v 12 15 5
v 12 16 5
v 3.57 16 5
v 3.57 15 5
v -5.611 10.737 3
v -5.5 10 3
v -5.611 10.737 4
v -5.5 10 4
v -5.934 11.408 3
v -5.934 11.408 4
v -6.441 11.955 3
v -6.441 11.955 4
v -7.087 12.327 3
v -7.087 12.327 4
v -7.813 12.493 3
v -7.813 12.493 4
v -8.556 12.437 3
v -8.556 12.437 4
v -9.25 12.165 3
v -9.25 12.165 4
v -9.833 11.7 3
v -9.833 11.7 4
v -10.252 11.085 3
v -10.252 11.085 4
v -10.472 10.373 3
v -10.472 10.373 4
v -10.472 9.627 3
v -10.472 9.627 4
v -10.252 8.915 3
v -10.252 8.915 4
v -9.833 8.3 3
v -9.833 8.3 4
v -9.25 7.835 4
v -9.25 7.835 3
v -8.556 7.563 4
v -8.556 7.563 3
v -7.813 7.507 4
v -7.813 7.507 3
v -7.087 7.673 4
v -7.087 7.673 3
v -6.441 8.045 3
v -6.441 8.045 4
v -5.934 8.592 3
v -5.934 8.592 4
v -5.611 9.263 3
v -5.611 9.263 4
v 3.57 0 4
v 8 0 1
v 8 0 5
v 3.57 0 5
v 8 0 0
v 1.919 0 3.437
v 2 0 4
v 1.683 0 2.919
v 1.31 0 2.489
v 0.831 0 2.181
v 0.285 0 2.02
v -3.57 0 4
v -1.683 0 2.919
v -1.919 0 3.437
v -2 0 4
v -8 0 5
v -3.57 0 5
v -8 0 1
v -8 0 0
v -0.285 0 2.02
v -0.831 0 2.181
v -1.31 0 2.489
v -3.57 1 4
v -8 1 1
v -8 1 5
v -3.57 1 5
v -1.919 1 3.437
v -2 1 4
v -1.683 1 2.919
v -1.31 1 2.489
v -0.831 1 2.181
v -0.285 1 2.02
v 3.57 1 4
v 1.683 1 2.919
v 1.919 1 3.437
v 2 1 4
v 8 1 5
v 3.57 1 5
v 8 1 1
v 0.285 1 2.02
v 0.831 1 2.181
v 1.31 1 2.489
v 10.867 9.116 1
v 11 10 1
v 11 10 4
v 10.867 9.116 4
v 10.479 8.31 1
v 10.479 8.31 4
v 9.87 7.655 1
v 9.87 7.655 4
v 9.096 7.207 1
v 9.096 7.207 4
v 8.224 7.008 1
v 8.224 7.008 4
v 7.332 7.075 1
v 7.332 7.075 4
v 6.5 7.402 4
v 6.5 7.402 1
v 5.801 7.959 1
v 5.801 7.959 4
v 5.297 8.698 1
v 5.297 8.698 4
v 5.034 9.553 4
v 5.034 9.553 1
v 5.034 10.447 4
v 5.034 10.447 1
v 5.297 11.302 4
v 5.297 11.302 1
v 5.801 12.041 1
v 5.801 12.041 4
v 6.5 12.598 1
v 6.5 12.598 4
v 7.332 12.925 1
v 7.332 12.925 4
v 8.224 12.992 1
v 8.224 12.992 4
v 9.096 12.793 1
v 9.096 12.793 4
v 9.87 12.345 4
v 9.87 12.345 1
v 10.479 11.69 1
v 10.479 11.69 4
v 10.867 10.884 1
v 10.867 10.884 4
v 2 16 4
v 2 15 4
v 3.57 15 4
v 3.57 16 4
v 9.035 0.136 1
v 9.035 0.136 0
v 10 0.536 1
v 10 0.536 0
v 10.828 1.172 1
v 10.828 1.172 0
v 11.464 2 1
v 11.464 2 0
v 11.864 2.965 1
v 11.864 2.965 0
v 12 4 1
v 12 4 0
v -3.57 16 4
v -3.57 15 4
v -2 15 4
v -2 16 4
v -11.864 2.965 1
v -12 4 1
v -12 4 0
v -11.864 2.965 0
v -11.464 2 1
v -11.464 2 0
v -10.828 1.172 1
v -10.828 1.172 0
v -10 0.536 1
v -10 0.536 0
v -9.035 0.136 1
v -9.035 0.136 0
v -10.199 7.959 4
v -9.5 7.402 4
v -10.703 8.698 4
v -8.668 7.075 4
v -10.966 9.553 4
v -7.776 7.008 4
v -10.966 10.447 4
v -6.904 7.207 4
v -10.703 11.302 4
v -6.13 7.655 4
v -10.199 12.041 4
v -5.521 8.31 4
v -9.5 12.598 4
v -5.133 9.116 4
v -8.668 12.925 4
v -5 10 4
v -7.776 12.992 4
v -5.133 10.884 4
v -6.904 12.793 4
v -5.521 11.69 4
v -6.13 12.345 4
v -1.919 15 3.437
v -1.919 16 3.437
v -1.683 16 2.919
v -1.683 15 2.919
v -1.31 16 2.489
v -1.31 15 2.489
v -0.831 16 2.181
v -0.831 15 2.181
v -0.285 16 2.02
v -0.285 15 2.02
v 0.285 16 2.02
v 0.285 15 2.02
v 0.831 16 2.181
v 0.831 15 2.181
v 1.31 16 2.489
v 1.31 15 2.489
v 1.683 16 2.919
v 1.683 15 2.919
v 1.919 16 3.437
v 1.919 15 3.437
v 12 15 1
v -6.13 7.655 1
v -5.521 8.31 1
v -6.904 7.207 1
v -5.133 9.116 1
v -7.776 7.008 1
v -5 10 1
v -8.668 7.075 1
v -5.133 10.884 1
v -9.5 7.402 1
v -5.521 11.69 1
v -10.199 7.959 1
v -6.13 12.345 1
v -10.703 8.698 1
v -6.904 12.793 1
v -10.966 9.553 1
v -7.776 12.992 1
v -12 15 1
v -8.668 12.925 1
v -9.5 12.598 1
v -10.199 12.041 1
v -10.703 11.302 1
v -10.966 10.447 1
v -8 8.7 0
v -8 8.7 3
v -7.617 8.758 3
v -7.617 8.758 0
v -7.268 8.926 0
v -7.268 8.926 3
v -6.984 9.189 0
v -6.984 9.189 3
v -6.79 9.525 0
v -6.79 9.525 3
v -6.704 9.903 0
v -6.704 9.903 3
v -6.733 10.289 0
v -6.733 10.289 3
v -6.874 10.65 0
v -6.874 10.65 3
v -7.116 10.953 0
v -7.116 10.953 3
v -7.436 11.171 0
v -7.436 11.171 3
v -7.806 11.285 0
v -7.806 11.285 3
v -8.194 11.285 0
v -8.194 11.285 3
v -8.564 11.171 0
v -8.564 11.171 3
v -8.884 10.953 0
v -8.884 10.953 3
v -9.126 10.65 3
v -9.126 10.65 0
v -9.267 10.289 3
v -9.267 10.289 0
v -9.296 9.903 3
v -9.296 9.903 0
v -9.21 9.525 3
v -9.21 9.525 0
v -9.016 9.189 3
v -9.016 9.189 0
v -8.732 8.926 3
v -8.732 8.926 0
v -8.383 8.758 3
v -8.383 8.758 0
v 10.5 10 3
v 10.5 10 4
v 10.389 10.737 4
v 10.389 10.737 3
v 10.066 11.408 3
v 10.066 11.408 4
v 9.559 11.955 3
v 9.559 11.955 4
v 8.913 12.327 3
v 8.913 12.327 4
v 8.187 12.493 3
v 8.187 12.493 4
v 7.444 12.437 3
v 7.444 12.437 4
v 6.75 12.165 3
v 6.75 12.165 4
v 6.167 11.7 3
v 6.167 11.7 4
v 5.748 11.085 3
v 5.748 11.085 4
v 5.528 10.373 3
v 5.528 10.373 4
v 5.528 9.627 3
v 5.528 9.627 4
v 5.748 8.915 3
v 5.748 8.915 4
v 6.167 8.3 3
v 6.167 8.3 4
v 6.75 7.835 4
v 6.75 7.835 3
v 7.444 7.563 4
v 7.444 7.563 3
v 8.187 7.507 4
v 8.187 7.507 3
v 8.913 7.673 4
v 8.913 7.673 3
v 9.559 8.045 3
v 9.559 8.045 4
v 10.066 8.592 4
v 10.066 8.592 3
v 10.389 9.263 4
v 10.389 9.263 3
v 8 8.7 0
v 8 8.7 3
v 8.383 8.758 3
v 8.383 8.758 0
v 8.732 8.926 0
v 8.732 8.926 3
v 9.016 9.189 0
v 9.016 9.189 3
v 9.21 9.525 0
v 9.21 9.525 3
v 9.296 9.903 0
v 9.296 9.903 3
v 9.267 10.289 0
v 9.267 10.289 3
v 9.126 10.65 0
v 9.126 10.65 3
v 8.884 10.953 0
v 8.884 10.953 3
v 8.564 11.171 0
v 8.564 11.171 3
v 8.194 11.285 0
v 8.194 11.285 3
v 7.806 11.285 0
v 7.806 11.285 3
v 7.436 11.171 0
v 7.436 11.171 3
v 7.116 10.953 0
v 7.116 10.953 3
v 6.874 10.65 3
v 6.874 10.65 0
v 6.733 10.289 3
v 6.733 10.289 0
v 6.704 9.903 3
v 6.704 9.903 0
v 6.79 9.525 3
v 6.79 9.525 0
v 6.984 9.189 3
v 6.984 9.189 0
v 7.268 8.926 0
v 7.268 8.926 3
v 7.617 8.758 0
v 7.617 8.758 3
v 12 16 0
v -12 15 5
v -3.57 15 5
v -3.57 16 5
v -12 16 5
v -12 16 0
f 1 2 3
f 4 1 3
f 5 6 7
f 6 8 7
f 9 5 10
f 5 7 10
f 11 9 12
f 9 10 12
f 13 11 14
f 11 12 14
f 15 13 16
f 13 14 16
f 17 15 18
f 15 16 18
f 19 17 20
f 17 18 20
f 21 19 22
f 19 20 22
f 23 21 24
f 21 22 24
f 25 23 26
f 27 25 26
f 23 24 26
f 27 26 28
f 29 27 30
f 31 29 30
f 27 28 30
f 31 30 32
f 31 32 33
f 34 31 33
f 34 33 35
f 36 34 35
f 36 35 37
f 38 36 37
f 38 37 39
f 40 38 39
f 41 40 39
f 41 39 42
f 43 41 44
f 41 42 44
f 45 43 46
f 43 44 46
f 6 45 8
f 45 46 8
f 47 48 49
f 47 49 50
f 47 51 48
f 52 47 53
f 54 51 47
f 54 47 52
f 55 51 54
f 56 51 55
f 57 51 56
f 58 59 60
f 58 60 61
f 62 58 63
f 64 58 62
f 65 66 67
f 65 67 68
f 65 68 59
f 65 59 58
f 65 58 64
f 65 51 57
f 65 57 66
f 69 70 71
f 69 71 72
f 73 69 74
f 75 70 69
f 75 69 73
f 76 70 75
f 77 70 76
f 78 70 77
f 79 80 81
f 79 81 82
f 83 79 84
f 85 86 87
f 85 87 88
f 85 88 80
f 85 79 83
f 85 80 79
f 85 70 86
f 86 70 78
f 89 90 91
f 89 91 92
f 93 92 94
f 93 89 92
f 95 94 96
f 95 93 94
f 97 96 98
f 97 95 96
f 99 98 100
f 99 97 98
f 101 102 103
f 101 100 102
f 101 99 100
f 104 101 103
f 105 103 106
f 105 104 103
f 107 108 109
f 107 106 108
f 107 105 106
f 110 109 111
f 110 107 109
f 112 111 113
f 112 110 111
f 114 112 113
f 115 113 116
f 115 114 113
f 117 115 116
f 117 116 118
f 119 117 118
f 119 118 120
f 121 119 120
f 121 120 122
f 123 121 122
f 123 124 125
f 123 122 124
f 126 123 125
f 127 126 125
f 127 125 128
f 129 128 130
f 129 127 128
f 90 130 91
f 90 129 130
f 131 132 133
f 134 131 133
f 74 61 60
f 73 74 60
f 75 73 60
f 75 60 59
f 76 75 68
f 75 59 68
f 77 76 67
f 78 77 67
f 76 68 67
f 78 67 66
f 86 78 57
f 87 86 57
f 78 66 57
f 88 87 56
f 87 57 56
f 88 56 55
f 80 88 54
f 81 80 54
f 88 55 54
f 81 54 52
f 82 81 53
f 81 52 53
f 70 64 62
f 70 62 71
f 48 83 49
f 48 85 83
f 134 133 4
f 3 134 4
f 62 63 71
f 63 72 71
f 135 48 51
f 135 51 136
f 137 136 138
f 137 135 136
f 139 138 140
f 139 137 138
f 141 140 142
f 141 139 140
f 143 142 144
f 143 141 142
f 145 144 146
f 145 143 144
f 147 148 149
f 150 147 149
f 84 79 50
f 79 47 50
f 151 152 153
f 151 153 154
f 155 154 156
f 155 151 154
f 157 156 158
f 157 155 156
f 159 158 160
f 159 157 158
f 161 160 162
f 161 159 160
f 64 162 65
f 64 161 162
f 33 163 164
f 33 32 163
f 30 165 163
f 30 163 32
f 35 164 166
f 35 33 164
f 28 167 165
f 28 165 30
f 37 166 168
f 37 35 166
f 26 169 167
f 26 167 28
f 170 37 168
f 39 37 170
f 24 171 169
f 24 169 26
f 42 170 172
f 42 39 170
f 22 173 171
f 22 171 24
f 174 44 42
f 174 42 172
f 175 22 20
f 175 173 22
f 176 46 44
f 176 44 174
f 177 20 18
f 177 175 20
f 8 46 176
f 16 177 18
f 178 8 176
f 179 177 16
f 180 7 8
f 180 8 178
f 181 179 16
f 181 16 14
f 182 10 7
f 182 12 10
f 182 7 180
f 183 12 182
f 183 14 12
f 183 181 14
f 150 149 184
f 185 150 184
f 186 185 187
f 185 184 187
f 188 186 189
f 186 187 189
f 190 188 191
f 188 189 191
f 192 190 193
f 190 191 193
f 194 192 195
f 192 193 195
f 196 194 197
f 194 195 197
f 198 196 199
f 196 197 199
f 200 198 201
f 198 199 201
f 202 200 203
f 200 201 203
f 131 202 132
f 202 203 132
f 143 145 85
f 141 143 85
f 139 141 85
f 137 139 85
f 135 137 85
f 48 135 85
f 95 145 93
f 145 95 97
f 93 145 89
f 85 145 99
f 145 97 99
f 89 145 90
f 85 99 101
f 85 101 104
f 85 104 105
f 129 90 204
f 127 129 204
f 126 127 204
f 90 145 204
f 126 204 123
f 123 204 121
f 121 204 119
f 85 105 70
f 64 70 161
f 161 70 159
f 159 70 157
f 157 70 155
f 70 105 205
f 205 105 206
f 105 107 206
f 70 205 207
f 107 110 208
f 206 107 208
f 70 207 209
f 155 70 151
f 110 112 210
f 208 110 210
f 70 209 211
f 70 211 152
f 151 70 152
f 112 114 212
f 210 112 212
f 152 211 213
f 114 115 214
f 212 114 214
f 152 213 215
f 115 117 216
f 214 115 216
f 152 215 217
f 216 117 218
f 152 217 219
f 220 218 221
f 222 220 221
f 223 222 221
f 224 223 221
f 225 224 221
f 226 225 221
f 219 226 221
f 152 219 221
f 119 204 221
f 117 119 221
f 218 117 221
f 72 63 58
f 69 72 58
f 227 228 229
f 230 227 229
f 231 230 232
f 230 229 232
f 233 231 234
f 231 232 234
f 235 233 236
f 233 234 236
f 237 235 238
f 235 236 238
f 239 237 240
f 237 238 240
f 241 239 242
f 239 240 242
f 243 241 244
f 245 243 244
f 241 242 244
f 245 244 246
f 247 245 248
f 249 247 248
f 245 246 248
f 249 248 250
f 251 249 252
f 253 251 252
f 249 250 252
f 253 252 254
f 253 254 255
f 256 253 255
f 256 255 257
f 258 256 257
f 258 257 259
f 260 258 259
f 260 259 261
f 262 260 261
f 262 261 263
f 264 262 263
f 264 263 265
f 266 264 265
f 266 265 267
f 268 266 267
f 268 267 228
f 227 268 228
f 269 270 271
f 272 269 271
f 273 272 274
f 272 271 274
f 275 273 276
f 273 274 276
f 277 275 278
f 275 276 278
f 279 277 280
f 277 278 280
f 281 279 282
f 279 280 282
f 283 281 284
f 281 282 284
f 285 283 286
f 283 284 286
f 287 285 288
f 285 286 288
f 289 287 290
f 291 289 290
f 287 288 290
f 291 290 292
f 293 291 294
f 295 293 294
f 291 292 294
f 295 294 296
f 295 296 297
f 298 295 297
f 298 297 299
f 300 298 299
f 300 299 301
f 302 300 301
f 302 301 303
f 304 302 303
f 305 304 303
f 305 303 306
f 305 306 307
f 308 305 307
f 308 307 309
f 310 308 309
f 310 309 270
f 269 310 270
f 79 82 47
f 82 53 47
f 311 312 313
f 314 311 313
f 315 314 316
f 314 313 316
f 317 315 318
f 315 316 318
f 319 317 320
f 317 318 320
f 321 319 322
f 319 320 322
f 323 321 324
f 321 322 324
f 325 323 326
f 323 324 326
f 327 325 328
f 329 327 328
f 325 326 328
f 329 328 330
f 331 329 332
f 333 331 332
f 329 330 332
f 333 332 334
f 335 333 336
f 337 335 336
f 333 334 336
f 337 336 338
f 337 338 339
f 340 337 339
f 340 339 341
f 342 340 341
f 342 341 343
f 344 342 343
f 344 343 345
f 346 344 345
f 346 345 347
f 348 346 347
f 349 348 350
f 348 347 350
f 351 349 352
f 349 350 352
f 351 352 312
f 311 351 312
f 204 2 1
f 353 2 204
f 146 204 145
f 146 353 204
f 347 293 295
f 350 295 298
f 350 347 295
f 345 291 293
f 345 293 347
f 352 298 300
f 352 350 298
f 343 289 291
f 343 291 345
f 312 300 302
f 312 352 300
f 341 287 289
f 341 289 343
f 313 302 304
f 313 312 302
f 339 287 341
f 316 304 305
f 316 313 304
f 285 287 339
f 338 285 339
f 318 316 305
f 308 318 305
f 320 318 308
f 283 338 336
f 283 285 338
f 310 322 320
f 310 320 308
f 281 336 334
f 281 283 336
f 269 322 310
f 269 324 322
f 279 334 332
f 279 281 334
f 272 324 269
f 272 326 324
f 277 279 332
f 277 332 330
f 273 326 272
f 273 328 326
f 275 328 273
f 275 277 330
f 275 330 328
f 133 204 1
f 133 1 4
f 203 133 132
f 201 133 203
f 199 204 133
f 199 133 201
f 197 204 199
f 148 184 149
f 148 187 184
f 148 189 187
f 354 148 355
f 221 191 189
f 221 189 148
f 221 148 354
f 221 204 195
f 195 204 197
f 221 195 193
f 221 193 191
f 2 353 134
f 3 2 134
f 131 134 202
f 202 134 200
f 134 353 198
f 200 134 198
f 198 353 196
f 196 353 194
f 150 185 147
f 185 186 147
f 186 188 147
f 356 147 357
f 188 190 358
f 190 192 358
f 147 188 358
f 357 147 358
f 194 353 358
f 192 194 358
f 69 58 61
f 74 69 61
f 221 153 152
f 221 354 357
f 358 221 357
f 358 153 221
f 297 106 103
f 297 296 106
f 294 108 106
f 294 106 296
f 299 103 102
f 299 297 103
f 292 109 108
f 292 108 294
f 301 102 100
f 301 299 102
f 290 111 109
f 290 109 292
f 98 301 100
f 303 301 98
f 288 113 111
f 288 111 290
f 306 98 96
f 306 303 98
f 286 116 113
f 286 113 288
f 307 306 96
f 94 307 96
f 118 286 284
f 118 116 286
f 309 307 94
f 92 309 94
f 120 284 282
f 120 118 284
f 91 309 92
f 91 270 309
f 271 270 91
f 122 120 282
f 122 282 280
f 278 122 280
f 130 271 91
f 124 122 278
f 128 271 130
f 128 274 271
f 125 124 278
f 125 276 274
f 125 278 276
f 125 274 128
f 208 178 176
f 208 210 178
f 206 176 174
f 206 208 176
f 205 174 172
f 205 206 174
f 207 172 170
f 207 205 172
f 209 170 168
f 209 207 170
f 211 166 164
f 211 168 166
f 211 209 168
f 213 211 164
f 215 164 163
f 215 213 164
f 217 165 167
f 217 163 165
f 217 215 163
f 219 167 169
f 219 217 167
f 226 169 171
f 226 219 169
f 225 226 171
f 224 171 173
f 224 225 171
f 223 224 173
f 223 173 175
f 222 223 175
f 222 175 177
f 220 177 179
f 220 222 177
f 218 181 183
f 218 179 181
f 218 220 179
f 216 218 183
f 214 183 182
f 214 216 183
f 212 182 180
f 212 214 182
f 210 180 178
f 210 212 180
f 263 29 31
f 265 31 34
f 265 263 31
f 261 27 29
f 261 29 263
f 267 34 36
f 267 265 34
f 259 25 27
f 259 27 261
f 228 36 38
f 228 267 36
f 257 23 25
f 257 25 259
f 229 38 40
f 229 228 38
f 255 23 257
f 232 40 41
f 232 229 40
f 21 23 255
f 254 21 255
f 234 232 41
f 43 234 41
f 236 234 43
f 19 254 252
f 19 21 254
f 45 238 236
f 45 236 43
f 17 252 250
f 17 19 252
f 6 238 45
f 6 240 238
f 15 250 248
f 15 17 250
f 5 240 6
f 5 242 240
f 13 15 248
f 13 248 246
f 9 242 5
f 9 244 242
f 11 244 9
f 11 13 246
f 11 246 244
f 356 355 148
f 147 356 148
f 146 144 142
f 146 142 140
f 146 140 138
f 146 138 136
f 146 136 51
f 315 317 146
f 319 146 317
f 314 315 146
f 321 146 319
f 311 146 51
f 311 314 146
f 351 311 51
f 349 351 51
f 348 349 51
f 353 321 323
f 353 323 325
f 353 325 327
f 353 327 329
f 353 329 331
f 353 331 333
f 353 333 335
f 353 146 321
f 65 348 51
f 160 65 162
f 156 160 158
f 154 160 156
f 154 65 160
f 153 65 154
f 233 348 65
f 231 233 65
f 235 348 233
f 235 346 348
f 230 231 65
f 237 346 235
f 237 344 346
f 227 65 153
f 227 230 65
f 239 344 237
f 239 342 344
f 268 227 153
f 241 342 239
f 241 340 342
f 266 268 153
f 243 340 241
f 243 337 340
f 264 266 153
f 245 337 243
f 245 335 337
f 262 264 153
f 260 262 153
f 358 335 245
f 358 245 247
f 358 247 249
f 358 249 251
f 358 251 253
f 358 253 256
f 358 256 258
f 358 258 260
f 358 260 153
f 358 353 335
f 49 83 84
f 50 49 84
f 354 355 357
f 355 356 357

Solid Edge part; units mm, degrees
sketch "Sketch1" plane through (0, 0, 0) normal (0, 0, 1) x (1, 0, 0)
  line L0 (12, 16) -> (12, 0)
  line L1 (12, 0) -> (-12, 0)
  line L2 (-12, 0) -> (-12, 16)
  line L3 (12, 16) -> (-12, 16)
  dimension "D1" = 24
  dimension "D2" = 16
extrude "Protrusion1" add sketch "Sketch1" along normal blind 1
sketch "Sketch2" plane through (0, 10, 1) normal (0, 0, 1) x (1, 0, 0)
  circle A0 centre (8, 0) radius 3
  circle A1 centre (-8, 0) radius 3
  dimension "D1" = 4
  dimension "D2" = 6
  dimension "D3" = 6
  dimension "D4" = 16
extrude "Screwholes" add sketch "Sketch2" along normal blind 3
sketch "Sketch3" plane through (-7.5, 10, 4) normal (0, 0, 1) x (1, 0, 0)
  circle A0 centre (-0.5, 0) radius 2.5
  circle A1 centre (15.5, 0) radius 2.5
  dimension "D1" = 5
extrude "Cutout___Holes" cut sketch "Sketch3" against normal blind 1
hole "Hole1" at (-8, 10, 3) direction (0, 0, -1) diameter 2.6 end up to next
hole "Hole2" at (8, 10, 3) direction (0, 0, -1) diameter 2.6 end up to next
sketch "Sketch4" plane through (0, 10, 1) normal (0, 0, 1) x (1, 0, 0)
  line L0 (-8, -10) -> (-8, -9)
  line L1 (-8, -9) -> (8, -9)
  line L2 (8, -9) -> (8, -10)
  line L3 (8, -10) -> (-8, -10)
  line L4 (12, 6) -> (12, 5)
  line L5 (12, 5) -> (-12, 5)
  line L6 (-12, 5) -> (-12, 6)
  line L7 (-12, 6) -> (12, 6)
  dimension "D1" = 4
  dimension "D2" = 1
  dimension "D3" = 1
extrude "Walls" add sketch "Sketch4" along normal blind 4
sketch "Sketch5" plane through (0, 0, 2.5) normal (0, -1, 0) x (1, 0, 0)
  line L0 (2, 1.5) -> (3.57, 1.5)
  line L1 (3.57, 1.5) -> (3.57, 2.5)
  line L2 (-3.57, 2.5) -> (3.57, 2.5)
  line L3 (-3.57, 2.5) -> (-3.57, 1.5)
  line L4 (-3.57, 1.5) -> (-2, 1.5)
  arc A0 (2, 1.5) -> (-2, 1.5) centre (0, 1.5) cw
  dimension "D1" = 4
  dimension "D2" = 7.14
  dimension "D3" = 3.57
  dimension "D4" = 1
extrude "Cutout1" cut sketch "Sketch5" against normal through all
fillet "Round___body" radius 4 2 edges at (12, 0, 0.5) (-12, 0, 0.5)
properties material "ABS Plastic, high impact"
